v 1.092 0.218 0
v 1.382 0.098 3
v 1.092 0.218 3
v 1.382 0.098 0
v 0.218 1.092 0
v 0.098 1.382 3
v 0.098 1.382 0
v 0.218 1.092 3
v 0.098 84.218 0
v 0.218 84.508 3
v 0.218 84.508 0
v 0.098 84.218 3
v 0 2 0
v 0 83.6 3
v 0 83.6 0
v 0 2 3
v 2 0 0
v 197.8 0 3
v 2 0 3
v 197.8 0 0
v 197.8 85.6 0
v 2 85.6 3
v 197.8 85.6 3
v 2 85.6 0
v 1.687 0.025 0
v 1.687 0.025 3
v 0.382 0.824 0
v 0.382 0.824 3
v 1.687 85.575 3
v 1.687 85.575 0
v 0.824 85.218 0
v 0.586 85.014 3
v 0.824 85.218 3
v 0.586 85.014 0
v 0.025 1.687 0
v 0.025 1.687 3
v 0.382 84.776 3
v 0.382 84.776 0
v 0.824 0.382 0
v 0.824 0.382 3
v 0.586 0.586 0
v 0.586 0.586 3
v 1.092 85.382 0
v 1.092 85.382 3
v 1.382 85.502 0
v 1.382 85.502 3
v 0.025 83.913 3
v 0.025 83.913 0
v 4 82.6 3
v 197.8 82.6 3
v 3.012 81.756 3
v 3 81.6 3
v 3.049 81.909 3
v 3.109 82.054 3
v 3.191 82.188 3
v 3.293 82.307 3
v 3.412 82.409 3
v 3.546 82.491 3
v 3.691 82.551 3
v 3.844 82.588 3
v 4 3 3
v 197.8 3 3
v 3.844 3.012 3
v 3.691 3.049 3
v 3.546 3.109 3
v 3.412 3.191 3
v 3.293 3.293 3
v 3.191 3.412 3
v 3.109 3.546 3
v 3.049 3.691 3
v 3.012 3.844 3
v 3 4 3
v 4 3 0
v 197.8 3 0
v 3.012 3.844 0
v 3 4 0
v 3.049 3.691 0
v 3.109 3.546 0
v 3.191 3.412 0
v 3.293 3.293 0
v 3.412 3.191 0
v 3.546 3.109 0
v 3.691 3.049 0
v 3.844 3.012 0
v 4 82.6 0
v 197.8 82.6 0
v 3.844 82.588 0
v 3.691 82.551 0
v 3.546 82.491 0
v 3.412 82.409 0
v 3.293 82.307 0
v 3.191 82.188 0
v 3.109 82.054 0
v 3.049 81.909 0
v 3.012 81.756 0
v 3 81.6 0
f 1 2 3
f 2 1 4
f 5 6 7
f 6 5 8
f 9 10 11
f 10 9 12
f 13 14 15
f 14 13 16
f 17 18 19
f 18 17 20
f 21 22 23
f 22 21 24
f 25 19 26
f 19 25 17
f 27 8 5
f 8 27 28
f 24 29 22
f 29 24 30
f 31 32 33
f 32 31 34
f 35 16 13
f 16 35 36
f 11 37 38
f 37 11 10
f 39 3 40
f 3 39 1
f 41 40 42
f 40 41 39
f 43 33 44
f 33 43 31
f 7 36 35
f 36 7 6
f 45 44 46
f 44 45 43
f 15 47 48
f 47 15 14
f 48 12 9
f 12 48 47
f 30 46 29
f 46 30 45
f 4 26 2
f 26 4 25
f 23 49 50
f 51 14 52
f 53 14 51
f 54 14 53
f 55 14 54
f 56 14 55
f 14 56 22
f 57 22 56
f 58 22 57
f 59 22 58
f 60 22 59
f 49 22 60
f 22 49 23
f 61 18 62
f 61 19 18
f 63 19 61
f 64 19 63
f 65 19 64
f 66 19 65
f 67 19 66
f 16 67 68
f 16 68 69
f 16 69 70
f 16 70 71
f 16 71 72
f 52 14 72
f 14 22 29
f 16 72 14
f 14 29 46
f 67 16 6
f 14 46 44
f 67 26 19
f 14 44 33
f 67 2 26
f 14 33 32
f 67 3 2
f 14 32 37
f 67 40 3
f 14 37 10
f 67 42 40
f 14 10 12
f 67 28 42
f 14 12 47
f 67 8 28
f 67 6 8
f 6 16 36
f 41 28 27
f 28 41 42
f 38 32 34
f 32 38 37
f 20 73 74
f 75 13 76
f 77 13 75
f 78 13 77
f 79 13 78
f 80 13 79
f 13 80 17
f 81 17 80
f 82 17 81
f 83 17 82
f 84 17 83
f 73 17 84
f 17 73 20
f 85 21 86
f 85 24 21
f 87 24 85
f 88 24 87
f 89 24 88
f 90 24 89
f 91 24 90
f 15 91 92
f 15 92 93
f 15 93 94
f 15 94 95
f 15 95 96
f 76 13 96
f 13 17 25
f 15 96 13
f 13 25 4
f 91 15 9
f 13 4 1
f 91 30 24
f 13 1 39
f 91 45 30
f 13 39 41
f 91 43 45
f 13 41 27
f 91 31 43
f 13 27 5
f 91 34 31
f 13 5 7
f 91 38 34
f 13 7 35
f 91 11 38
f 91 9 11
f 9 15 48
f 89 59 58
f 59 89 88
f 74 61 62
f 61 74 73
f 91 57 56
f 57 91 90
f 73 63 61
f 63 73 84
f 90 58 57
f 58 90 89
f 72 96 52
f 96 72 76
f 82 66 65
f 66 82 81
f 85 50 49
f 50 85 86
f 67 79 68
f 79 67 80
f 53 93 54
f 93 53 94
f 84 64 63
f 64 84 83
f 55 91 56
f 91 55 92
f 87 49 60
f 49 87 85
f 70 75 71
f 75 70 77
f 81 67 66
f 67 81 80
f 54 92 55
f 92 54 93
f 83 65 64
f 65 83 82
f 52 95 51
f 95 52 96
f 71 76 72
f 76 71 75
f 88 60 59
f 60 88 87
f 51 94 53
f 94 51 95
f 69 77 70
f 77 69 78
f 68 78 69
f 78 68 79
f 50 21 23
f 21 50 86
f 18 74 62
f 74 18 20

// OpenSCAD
include <protective_storage_box.scad>
lid_angle = 0;
show_tray_in_assembly = false;
render_assembly = false;
lid_weave_frame_left();
